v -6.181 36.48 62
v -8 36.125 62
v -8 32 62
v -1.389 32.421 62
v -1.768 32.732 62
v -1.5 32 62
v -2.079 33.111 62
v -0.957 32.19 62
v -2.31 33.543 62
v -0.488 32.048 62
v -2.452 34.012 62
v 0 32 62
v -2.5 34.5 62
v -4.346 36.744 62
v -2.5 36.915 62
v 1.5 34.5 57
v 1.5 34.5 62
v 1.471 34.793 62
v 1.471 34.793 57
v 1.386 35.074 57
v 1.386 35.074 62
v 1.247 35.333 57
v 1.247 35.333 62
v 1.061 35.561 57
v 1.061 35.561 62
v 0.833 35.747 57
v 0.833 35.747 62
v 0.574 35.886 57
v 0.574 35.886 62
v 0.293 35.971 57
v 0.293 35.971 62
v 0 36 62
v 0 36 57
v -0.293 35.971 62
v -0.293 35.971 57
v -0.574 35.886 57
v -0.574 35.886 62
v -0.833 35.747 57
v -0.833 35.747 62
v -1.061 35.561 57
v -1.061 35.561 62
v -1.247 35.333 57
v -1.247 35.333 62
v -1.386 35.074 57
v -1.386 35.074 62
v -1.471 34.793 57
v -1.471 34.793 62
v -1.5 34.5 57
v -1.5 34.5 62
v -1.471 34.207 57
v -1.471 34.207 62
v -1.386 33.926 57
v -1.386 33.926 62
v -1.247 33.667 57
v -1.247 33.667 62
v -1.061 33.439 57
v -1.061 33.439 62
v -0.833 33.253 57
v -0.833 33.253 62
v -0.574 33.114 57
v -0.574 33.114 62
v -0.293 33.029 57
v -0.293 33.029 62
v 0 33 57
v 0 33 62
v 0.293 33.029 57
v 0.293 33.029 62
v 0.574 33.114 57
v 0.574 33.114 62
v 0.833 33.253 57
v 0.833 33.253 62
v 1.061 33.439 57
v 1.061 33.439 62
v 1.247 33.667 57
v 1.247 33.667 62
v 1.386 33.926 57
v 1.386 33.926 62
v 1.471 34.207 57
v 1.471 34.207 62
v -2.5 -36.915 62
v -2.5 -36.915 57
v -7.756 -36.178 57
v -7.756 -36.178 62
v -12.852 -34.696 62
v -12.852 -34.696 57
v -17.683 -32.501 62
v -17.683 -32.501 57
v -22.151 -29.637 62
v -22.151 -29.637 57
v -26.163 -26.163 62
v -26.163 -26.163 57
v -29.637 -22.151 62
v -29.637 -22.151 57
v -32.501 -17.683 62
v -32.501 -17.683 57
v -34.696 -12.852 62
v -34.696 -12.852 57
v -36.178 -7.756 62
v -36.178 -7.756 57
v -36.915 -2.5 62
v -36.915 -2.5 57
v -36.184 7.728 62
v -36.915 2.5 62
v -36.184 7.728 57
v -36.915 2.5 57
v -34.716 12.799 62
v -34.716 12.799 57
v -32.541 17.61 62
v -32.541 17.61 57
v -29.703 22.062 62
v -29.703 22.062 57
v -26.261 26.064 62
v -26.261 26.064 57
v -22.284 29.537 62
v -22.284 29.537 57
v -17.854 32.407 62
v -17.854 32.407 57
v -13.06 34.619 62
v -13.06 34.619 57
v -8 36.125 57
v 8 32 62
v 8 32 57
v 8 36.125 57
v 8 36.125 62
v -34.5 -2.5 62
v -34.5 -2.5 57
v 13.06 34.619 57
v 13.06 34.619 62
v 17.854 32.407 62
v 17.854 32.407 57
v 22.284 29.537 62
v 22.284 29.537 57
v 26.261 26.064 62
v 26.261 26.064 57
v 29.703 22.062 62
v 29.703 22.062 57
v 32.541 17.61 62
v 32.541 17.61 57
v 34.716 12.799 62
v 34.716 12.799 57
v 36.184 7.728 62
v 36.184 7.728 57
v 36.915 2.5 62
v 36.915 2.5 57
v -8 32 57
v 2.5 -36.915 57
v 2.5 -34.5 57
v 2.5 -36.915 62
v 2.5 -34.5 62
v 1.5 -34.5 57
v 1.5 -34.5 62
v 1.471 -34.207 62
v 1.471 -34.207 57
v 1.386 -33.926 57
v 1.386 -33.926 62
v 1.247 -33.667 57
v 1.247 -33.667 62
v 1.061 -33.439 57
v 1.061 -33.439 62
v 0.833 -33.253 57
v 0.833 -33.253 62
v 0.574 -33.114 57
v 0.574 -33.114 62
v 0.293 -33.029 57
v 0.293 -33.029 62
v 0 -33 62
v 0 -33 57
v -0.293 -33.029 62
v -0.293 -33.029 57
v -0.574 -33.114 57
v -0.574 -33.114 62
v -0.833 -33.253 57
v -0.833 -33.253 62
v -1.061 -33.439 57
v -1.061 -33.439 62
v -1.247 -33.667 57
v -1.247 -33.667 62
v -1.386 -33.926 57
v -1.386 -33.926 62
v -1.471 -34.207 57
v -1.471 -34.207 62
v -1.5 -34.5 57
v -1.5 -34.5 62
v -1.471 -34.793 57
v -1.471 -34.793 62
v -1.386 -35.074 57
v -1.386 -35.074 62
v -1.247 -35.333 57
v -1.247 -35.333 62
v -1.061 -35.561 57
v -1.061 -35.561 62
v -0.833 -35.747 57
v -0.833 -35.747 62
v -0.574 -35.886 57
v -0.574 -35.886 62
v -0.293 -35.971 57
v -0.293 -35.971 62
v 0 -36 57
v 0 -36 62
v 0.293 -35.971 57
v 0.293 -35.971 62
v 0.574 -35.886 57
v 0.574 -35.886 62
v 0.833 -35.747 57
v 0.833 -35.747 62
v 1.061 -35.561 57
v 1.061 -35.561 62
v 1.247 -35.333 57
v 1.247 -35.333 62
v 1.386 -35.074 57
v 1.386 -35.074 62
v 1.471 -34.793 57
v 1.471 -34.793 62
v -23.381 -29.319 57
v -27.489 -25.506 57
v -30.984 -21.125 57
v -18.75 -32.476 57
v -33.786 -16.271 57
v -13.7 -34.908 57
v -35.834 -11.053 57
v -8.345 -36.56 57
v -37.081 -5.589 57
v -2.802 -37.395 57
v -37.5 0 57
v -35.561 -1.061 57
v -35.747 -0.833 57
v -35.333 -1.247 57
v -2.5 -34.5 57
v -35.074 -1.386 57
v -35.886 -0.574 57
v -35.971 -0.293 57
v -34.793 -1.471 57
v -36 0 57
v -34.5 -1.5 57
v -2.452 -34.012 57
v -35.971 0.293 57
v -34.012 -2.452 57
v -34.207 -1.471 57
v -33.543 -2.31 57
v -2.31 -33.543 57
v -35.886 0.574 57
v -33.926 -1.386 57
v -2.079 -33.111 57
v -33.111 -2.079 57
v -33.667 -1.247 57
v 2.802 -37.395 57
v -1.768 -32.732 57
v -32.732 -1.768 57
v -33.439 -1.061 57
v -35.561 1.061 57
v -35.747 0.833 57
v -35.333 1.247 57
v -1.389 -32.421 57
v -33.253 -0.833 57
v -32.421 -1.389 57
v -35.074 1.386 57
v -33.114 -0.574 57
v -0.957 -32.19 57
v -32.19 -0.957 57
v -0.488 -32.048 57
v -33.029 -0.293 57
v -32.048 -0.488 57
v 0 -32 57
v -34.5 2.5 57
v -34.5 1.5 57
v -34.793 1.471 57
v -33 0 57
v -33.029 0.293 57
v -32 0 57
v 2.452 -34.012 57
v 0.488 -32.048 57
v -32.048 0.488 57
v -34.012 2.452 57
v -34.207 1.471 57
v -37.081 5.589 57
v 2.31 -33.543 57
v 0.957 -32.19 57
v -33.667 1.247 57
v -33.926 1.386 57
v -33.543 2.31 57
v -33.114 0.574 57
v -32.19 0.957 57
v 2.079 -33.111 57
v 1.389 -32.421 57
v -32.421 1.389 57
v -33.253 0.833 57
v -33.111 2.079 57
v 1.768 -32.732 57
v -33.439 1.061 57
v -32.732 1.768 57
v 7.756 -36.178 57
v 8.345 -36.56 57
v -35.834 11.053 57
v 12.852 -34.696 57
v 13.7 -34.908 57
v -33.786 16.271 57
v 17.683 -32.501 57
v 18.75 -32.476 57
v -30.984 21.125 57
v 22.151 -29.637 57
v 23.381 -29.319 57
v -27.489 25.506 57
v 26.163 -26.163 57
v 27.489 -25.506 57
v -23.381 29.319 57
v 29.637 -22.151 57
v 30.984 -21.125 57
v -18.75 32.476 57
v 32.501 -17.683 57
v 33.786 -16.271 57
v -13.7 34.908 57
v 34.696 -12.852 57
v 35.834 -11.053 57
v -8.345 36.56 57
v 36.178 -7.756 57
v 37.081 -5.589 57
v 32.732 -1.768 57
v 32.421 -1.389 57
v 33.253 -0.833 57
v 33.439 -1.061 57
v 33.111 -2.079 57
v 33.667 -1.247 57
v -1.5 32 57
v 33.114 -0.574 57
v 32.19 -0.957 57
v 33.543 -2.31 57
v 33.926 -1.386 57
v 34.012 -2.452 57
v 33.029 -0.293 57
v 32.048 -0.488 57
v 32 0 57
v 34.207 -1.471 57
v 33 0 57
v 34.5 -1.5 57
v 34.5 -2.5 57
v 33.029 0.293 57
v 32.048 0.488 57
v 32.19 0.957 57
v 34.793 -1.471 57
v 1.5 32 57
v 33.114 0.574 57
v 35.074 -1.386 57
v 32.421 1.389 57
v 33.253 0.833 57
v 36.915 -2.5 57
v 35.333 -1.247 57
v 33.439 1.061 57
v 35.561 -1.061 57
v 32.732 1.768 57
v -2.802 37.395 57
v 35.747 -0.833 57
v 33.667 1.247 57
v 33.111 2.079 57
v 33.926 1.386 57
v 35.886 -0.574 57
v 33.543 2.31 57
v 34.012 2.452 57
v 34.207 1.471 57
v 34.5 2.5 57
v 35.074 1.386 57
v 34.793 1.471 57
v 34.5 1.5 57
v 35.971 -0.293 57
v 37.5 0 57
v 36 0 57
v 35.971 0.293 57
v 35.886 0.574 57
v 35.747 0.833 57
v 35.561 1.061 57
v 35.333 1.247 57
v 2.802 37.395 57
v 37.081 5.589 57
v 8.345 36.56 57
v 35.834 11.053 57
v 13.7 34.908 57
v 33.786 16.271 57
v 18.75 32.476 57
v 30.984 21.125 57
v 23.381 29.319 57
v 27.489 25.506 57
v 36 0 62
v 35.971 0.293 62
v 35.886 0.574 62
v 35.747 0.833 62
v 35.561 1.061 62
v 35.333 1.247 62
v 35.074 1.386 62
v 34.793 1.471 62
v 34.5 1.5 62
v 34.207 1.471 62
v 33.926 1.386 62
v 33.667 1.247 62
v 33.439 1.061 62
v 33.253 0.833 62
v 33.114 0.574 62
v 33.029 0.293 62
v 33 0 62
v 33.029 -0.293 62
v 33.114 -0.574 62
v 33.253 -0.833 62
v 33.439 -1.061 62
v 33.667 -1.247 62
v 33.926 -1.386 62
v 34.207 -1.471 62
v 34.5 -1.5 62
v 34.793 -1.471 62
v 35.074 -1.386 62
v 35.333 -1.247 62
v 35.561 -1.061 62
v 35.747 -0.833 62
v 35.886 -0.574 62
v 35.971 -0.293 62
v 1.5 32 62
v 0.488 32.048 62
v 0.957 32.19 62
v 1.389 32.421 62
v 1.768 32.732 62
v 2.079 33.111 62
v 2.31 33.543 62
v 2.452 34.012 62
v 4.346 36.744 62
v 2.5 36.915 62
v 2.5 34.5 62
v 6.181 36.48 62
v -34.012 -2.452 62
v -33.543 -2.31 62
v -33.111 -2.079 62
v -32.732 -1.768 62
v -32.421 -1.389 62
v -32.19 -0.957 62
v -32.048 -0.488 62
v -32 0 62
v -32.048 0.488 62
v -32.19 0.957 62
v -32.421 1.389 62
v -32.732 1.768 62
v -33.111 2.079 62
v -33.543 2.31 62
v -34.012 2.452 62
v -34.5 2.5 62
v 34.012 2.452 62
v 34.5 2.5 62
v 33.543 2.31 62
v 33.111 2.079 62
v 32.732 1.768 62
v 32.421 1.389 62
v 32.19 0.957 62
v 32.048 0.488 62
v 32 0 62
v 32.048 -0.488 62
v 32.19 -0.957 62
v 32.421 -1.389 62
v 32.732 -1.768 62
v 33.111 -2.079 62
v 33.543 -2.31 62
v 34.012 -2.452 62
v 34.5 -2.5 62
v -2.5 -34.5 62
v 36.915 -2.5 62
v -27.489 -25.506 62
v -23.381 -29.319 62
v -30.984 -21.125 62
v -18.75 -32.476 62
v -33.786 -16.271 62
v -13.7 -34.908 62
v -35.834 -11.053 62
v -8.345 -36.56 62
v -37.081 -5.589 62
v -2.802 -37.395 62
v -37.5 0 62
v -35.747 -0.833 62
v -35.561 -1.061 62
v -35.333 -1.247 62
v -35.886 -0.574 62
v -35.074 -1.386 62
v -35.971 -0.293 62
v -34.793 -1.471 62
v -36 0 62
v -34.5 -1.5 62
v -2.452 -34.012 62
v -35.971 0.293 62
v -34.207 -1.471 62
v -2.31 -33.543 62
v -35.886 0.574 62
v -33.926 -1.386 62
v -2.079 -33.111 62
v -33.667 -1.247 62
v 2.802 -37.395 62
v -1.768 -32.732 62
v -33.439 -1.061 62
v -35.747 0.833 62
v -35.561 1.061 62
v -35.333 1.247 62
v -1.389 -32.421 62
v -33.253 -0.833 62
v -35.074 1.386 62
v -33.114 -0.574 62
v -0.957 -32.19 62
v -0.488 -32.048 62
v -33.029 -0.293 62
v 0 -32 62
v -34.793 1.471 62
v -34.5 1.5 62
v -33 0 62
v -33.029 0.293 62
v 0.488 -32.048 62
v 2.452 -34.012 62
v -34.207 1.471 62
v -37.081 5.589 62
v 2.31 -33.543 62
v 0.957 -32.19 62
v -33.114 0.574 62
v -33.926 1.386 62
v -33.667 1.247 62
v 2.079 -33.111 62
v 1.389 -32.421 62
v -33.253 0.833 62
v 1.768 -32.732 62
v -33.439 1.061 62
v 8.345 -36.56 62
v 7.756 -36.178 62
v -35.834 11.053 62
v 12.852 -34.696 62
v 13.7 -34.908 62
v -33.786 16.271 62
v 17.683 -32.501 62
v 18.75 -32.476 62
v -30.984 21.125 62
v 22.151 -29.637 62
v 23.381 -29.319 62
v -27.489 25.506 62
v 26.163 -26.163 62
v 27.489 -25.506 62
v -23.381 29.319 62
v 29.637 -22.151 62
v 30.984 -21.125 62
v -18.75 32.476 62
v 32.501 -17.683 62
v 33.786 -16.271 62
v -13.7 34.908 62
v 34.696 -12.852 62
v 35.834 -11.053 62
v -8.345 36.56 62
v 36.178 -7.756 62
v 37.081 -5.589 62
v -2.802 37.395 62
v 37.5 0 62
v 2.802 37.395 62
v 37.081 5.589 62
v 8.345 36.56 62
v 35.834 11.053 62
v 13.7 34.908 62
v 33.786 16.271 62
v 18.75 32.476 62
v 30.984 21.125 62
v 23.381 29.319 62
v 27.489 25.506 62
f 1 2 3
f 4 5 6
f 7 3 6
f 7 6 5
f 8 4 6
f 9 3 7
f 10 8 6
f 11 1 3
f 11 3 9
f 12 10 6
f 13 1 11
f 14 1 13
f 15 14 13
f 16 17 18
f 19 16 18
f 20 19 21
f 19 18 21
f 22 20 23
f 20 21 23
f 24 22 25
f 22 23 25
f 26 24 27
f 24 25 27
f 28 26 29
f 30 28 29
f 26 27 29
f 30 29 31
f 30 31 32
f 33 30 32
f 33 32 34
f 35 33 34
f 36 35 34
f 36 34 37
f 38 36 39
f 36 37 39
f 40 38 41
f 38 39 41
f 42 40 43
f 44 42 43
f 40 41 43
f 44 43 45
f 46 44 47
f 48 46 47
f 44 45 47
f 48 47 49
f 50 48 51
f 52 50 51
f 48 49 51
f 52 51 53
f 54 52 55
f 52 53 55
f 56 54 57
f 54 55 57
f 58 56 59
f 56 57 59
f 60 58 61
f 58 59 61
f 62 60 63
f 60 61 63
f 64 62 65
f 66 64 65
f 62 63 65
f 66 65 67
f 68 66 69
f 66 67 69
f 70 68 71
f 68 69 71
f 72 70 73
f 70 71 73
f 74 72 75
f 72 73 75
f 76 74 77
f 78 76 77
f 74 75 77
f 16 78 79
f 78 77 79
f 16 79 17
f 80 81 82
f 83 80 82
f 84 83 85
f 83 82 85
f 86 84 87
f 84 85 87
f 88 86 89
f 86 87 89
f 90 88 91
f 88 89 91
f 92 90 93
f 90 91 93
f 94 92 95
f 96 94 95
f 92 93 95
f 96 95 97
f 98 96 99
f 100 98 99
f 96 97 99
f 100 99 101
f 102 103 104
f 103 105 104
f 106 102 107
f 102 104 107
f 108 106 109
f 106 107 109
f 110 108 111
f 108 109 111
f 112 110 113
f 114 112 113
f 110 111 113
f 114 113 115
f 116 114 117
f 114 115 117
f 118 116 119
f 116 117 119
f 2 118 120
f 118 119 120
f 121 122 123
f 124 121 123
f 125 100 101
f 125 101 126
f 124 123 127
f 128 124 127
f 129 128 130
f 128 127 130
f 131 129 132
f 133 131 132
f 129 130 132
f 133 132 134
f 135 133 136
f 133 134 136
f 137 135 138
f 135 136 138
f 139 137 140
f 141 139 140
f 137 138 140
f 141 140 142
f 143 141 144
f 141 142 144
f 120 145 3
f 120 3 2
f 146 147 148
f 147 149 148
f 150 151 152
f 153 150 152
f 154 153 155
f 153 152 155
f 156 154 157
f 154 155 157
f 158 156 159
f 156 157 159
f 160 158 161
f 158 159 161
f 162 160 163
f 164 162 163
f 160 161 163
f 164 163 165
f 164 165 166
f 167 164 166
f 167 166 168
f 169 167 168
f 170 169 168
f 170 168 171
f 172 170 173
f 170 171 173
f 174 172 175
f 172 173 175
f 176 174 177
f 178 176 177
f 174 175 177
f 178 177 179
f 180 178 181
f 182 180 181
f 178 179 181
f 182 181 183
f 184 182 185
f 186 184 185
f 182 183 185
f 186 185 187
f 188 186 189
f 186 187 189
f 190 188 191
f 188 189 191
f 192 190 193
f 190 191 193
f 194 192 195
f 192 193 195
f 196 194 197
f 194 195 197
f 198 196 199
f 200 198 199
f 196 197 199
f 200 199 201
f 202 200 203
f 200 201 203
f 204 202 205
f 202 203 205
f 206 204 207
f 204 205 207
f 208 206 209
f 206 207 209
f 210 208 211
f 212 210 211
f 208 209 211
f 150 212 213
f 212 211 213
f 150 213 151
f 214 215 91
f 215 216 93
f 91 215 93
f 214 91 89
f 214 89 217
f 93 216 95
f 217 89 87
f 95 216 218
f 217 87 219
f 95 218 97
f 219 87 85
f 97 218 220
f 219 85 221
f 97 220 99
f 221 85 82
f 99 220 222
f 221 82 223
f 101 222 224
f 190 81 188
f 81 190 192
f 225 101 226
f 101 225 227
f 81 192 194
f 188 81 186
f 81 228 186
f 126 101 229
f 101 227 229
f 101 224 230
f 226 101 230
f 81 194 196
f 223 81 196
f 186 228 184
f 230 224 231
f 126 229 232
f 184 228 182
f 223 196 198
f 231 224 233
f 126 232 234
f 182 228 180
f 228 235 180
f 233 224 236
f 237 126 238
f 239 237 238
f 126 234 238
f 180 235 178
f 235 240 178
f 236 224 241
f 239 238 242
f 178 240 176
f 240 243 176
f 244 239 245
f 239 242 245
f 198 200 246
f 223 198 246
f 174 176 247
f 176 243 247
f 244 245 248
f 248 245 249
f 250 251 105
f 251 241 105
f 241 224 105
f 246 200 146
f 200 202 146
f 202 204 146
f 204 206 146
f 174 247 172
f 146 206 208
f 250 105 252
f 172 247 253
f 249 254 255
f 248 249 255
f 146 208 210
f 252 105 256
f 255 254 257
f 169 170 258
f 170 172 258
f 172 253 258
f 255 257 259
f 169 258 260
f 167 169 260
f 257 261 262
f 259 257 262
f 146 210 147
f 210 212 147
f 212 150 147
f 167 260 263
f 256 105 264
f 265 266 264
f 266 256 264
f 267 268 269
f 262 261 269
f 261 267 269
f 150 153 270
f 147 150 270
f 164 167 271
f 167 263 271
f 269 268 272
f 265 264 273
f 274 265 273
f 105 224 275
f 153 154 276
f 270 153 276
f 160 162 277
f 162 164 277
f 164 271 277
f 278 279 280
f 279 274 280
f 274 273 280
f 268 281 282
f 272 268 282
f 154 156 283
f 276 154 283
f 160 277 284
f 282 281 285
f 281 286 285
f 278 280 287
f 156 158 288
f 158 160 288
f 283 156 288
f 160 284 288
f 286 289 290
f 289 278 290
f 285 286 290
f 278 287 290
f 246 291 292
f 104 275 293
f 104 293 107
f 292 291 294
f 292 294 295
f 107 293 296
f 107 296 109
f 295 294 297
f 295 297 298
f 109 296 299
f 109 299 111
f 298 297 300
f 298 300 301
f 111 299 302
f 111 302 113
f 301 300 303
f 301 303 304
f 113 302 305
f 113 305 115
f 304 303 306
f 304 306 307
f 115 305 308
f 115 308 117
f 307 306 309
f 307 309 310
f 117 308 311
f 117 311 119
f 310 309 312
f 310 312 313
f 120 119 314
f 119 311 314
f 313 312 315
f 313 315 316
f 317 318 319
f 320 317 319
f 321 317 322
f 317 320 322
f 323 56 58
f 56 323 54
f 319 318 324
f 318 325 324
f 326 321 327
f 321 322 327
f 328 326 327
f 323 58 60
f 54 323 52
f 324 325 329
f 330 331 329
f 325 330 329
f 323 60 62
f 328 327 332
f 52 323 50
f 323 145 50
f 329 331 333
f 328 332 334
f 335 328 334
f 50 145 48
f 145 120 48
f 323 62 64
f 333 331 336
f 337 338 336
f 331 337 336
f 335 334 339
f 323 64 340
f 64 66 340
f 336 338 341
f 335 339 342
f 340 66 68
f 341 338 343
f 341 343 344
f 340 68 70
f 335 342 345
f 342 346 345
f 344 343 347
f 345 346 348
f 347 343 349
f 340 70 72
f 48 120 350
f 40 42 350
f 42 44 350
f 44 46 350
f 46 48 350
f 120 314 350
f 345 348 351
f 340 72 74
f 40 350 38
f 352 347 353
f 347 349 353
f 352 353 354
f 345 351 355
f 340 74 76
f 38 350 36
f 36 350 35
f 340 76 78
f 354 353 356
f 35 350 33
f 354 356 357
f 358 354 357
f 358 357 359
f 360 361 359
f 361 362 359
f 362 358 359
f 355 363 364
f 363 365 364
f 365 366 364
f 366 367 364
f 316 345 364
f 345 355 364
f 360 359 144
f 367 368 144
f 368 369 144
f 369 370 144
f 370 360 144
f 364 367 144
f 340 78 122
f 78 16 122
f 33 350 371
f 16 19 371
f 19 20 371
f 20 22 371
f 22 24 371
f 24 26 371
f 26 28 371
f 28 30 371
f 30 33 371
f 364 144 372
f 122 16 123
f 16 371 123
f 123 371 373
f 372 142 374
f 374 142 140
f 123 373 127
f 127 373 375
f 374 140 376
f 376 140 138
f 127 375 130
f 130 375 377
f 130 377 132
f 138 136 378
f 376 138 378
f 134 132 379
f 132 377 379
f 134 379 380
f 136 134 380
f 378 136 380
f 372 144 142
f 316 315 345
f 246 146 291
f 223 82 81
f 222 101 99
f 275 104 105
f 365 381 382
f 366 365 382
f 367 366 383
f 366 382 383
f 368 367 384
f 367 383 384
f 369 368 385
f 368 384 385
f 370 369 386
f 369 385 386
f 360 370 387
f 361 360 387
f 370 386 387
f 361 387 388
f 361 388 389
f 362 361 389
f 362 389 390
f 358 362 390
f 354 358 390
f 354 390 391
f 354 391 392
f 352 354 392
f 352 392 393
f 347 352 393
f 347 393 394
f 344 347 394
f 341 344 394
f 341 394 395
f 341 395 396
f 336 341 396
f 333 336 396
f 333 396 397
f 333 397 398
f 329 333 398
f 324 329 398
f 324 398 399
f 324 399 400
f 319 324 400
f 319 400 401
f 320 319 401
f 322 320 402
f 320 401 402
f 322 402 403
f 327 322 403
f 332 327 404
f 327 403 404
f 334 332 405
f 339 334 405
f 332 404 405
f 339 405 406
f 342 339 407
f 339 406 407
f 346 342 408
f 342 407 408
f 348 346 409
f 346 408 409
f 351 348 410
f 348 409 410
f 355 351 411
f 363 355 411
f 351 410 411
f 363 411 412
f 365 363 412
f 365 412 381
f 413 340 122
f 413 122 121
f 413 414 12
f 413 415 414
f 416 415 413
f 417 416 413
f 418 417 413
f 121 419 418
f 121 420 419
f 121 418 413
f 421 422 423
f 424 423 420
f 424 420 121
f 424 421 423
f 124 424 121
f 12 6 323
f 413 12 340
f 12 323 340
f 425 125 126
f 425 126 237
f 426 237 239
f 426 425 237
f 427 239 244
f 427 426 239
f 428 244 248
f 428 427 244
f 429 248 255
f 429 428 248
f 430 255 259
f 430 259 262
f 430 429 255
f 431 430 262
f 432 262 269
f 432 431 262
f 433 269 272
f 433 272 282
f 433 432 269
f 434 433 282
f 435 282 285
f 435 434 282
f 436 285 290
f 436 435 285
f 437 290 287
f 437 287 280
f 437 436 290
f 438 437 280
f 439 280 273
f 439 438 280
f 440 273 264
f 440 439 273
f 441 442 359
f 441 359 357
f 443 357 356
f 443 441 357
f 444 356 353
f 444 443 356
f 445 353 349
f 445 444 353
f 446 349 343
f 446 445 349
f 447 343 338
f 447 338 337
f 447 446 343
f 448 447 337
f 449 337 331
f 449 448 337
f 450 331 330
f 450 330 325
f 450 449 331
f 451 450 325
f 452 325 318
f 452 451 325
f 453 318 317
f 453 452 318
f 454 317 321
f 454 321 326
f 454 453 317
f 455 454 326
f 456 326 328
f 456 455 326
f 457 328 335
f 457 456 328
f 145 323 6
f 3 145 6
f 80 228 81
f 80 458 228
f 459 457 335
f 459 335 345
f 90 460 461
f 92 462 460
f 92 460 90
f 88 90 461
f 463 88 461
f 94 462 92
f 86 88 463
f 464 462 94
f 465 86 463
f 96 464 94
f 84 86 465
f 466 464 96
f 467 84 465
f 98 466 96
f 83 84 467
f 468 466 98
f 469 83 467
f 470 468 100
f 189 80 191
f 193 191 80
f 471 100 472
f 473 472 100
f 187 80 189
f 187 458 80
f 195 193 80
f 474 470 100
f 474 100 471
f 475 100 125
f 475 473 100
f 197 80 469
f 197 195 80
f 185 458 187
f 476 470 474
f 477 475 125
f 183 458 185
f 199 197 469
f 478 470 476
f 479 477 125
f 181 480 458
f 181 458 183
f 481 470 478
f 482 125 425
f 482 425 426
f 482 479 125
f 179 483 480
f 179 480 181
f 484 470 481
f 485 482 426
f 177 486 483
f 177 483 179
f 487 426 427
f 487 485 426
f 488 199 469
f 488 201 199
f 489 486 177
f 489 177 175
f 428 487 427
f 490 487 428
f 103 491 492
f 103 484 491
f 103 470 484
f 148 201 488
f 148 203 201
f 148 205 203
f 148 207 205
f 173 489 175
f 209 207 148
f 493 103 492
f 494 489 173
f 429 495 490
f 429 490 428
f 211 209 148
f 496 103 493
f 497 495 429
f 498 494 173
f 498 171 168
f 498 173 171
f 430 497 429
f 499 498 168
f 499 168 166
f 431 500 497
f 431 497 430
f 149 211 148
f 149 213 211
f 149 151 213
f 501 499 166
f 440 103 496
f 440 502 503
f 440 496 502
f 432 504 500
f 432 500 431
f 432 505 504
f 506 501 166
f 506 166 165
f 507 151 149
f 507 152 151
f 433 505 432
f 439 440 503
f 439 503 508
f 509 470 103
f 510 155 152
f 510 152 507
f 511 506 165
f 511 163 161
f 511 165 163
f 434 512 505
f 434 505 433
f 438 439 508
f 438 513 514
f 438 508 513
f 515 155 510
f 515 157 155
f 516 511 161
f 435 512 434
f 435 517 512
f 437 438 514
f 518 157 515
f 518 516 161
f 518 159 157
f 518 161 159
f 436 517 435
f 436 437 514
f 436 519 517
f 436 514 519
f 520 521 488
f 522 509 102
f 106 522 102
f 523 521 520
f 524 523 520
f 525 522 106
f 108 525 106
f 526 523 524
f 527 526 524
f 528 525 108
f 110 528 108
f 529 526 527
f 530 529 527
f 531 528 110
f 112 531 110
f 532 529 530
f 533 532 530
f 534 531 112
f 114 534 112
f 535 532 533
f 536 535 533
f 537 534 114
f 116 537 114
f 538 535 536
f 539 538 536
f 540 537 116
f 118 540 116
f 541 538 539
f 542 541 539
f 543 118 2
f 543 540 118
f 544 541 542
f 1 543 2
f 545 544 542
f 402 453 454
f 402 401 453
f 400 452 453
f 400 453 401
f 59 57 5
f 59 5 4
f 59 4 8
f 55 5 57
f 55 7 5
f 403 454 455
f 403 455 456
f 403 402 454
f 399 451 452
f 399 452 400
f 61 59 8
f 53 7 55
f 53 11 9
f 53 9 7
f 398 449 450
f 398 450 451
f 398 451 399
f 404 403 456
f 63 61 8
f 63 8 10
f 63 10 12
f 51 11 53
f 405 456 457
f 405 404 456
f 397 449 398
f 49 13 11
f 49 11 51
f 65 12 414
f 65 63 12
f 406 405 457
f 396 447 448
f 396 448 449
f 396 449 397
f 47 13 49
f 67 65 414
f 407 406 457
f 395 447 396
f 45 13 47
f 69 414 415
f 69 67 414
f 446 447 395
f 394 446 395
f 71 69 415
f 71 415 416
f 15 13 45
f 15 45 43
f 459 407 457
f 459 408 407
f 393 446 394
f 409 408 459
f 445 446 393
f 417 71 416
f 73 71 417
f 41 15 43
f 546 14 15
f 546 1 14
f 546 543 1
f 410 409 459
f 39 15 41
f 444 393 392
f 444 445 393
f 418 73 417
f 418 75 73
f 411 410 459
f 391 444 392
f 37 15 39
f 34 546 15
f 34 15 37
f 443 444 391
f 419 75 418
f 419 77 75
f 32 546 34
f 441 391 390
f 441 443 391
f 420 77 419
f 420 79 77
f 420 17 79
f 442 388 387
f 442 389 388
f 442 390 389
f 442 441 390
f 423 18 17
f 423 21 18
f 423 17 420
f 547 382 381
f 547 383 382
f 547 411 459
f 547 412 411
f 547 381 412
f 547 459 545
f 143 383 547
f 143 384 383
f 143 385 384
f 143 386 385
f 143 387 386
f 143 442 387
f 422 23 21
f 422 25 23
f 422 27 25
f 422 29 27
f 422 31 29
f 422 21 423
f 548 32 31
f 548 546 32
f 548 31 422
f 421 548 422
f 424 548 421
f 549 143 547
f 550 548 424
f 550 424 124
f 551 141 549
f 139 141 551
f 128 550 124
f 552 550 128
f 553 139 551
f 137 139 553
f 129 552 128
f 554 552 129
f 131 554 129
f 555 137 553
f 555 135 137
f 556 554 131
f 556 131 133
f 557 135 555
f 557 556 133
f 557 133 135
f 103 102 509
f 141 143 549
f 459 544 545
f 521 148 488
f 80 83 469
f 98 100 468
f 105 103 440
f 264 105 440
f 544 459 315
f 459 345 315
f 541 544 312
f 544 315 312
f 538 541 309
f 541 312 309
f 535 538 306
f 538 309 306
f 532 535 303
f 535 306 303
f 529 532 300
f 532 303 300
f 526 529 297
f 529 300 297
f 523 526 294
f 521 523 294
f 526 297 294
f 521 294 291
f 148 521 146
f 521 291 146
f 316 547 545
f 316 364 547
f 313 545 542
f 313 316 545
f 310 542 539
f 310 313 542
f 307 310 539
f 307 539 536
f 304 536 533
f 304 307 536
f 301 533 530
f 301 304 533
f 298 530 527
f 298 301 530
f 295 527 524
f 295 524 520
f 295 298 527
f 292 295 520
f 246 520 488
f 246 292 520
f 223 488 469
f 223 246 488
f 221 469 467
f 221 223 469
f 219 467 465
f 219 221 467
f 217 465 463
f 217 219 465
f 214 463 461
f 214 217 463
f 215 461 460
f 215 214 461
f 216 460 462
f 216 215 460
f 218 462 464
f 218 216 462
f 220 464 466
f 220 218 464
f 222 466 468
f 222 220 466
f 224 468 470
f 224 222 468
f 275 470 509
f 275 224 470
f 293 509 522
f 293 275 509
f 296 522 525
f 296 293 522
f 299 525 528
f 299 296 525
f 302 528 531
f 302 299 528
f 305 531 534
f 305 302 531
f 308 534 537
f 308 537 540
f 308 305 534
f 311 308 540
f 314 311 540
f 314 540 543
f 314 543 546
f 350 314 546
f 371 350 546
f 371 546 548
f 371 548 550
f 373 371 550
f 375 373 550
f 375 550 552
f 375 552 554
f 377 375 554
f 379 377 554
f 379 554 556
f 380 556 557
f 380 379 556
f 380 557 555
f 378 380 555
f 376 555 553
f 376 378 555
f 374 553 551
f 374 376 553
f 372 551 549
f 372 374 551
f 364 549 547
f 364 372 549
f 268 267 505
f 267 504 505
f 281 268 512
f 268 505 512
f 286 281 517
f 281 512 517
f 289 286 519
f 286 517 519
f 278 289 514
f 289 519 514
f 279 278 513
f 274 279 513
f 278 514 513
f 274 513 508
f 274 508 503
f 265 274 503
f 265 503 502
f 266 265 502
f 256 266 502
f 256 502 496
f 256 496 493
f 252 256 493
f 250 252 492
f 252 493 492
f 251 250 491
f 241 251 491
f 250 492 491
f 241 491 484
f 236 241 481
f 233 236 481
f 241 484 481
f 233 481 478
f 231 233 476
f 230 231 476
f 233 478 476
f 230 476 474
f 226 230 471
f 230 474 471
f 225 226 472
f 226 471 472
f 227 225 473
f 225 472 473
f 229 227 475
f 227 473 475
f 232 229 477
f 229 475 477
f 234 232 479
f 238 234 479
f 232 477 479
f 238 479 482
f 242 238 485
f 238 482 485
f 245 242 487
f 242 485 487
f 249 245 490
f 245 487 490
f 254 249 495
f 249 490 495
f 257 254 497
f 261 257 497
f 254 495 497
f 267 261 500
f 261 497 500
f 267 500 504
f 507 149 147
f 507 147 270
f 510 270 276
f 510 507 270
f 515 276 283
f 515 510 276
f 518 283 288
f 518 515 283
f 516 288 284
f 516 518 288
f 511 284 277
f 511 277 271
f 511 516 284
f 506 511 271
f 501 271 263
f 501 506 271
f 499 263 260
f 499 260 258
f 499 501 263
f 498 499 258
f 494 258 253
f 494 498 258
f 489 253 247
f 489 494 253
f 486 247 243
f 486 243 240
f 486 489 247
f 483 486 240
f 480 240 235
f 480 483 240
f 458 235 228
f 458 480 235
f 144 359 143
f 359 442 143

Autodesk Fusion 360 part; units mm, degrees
sketch "Esboço2" plane through (0, 0, 0) normal (0, 0, 1) x (1, 0, 0)
  circle A0 centre (0, 0) radius 37.5
  circle A1 centre (0, 0) radius 37
  dimension "d6" = 75
  dimension "d7" = 74
extrude "Extrusão2" add sketch "Esboço2" along normal blind 190
ref_plane "Plano de trabalho9" through (0, 0, 187) normal (0, 0, 1) x (1, 0, 0)
sketch "Esboço10" plane through (0, 0, 187) normal (0, 0, 1) x (1, 0, 0)
  circle A0 centre (0, 0) radius 34.5 construction
  line L0 (0, 0) -> (-68.1762, 0) construction
  line L1 (0, 0) -> (60, 0) construction
  line L2 (0, 0) -> (0, 45) construction
  line L3 (0, 0) -> (0, -43.1659) construction
  circle A1 centre (34.5, 0) radius 1.5
  line L4 (3, -43) -> (3, -42)
  circle A2 centre (0, 34.5) radius 1.5
  circle A3 centre (-34.5, 0) radius 1.5
  circle A4 centre (0, -34.5) radius 1.5
  arc A5 (34.5, 2.5) -> (34.5, -2.5) centre (34.5, 0) ccw
  arc A6 (-2.5, 34.5) -> (2.5, 34.5) centre (0, 34.5) ccw
  arc A7 (-34.5, -2.5) -> (-34.5, 2.5) centre (-34.5, 0) ccw
  arc A8 (2.5, -34.5) -> (-2.5, -34.5) centre (0, -34.5) ccw
  circle A9 centre (0, 0) radius 37
  line L5 (-36.9154, 2.5) -> (-34.4093, 2.5)
  line L6 (-36.9154, -2.5) -> (-34.4093, -2.5)
  line L7 (34.5, 2.5) -> (36.9154, 2.5)
  line L8 (34.5, -2.5) -> (36.9154, -2.5)
  line L9 (2.5, 36.9154) -> (2.5, 34.4093)
  line L10 (-2.5, 36.9154) -> (-2.5, 34.4093)
  line L11 (-2.5, -34.4093) -> (-2.5, -36.9154)
  line L12 (2.5, -34.4093) -> (2.5, -36.9154)
  dimension "d82" = 69
  dimension "d83" = 3
  dimension "d84" = 2.5
  dimension "d85" = 2.5
  dimension "d87" = 360
  dimension "d89" = 360
  dimension "d90" = 2.5
extrude "Extrusão12" add sketch "Esboço10" against normal blind 184 contours A5 A9 L7 L8 | A6 A9 L9 L10 | A8 A9 L11 L12 | A7 A9 L5 L6
thread "Rosca3"
ref_plane "Plano de trabalho3" through (0, 0, 32) normal (0, 0, 1) x (1, 0, 0)
sketch "Esboço3" plane through (0, 0, 32) normal (0, 0, 1) x (1, 0, 0)
  line L0 (0, 0) -> (0, 37) construction
  line L1 (34.2491, 14) -> (-34.2491, 14)
  circle A0 centre (0, 0) radius 37
  line L2 (31.1288, 20) -> (-31.1288, 20)
  line L3 (32.8634, 17) -> (-32.8634, 17)
  circle A1 centre (0, 0) radius 50
  circle A2 centre (0, 0) radius 37.5
  line L4 (-8, 0) -> (8, 0)
  line L5 (8, 0) -> (8, 36.1248)
  line L6 (-8, 0) -> (-8, 36.1248)
  circle A3 centre (0, 34.5) radius 1.5
  line L7 (1.5, 32.5) -> (1.5, 0)
  arc A4 (-2.5, 34.5) -> (2.5, 34.5) centre (0, 34.5) ccw
  line L8 (-1.5, 32.5) -> (-1.5, 0)
  line L9 (27.8634, 24.3441) -> (27.8634, 11)
  line L10 (27.8634, 11) -> (35.327, 11)
  line L11 (-27.8634, 11) -> (-35.327, 11)
  line L12 (-27.8634, 24.3441) -> (-27.8634, 11)
  line L13 (-30.4631, 21) -> (30.4631, 21)
  line L14 (-34.641, 13) -> (34.641, 13)
  line L15 (0, 32) -> (8, 32)
  line L16 (0, 32) -> (-8, 32)
  dimension "d12" = 6
  dimension "d15" = 3
  dimension "d17" = 75
  dimension "d18" = 100
  dimension "d41" = 14
  dimension "d51" = 8
  dimension "d52" = 16
  dimension "d99" = 3
  dimension "d100" = 2.5
  dimension "d115" = 6.5
  dimension "d123" = 5
  dimension "d124" = 6
  dimension "d143" = 4
  dimension "d144" = 4
extrude "Extrusão21" add sketch "Esboço3" along normal blind 6 and the other way blind 6 contours L1 A0 L9 L14 | L1 A0 L3 L9 | A0 L9 L10 L14 | A0 L2 L3 L9 | A0 L2 L9 L13 | A0 L9 L13 | A0 L11 L12 L14 | L1 A0 L12 L14 | L1 A0 L3 L12 | A0 L2 L3 L12 | A0 L12 L13 | A0 L2 L12 L13
sketch "Esboço18" plane through (-27.8634, 0, 0) normal (1, 0, 0) x (0, 1, 0)
  line L0 (24.3441, 26) -> (24.3441, 38)
  line L1 (24.3441, 38) -> (11, 38)
  line L2 (11, 38) -> (11, 26)
  line L3 (11, 26) -> (24.3441, 26)
  circle A0 centre (17, 32) radius 4
  point P0 (11, 32)
  dimension "d166" = 8
  dimension "d167" = 6
  dimension "d168" = 6
ref_plane "Plano de trabalho11" through (0, 0, 0) normal (1, 0, 0) x (0, 1, 0)
extrude "Extrusão23" cut sketch "Esboço18" against normal blind 15 contours A0
extrude "Extrusão7" add sketch "Esboço3" along normal blind 30 and the other way blind 30 contours L1 L5 L7 L14 | L1 L3 L5 L7 | L4 L5 L7 L14 | L2 L3 L5 L7 | L1 L6 L8 L14 | L1 L3 L6 L8 | L2 L5 L7 L13 | L2 L3 L6 L8 | L4 L6 L8 L14 | L5 L7 L13 L15 | A0 L5 L6 L7 A4 L8 L15 L16 | L2 L6 L8 L13 | L6 L8 L13 L16 | L7 A4 L15 | A4 L8 L16
sketch "Esboço19" plane through (27.8634, 0, 0) normal (-1, 0, 0) x (0, -1, 0)
  line L0 (-11, 26) -> (-11, 38)
  line L1 (-11, 38) -> (-24.3441, 38)
  line L2 (-24.3441, 38) -> (-24.3441, 26)
  line L3 (-24.3441, 26) -> (-11, 26)
extrude "Extrusão24" cut sketch "Esboço18" along normal blind 80 contours A0
sketch "Esboço11" plane through (8, 0, 0) normal (1, 0, 0) x (0, 1, 0)
  line L0 (0, 2) -> (36.1248, 2)
  line L1 (36.1248, 2) -> (36.1248, 62)
  line L2 (36.1248, 62) -> (0, 62)
  line L3 (0, 62) -> (0, 2)
  circle A0 centre (17, 32) radius 3
  circle A1 centre (17, 32) radius 9.5
  circle A2 centre (17, 32) radius 12.5
  line L4 (36.1248, 32) -> (36.1248, -5) construction
  line L5 (0, 32) -> (36.1248, 32)
  line L6 (30.1248, 2) -> (8.3278, 22.9976)
  line L7 (30.1248, 62) -> (8.3278, 41.0024)
  line L8 (30.1248, 2) -> (31.9998, 2)
  line L9 (31.9998, 2) -> (31.9998, 32)
  line L10 (30.1248, 62) -> (31.9998, 62)
  line L11 (31.9998, 62) -> (31.9998, 32)
  circle A3 centre (17, 32) radius 4
  point P0 (14, 32)
  point P1 (20, 32)
  dimension "d106" = 6
  dimension "d107" = 19
  dimension "d109" = 25
  dimension "d110" = 6
  dimension "d147" = 1.875
extrude "Extrusão13" cut sketch "Esboço11" against normal blind 16 contours L0 L3 A2 L5 L6 | L0 A2 L5 L6 L8 L9 | L2 L3 A2 L5 L7 | A1 A2 L5 | A1 A2 L5 | L2 A2 L5 L7 L10 L11 | A1 L5 A3 | A1 L5 A3 | A0 L5 A3 | A0 L5 A3 | A0 L5 | A0 L5
ref_plane "Plano de trabalho4" through (0, 0, 150) normal (0, 0, 1) x (1, 0, 0)
sketch "Esboço4" plane through (0, 0, 150) normal (0, 0, 1) x (1, 0, 0)
  circle A0 centre (0, 0) radius 37
  circle A1 centre (0, 0) radius 50
  circle A2 centre (0, 0) radius 37.5
  line L0 (-20, -31.1288) -> (-20, 31.1288)
  line L1 (-17, -32.8634) -> (-17, 32.8634)
  line L2 (-14, -34.2491) -> (-14, 34.2491)
  line L3 (0, 8) -> (0, -8)
  line L4 (0, 8) -> (-36.1248, 8)
  line L5 (0, -8) -> (-36.1248, -8)
  line L6 (0, 0) -> (-37, 0) construction
  circle A3 centre (-34.5, 0) radius 1.5
  line L7 (0, 1.5) -> (-32.5, 1.5)
  arc A4 (-34.5, -2.5) -> (-34.5, 2.5) centre (-34.5, 0) ccw
  line L8 (0, -1.5) -> (-32.5, -1.5)
  line L9 (-24.3441, -27.8634) -> (-11, -27.8634)
  line L10 (-11, -27.8634) -> (-11, -35.327)
  line L11 (-24.3441, 27.8634) -> (-11, 27.8634)
  line L12 (-11, 27.8634) -> (-11, 35.327)
  line L13 (-13, 34.641) -> (-13, -34.641)
  line L14 (-21, 30.4631) -> (-21, -30.4631)
  line L15 (-32, 0) -> (-32, 8)
  line L16 (-32, 0) -> (-32, -8)
  dimension "d28" = 75
  dimension "d29" = 100
  dimension "d38" = 14
  dimension "d39" = 6
  dimension "d40" = 3
  dimension "d43" = 16
  dimension "d44" = 8
  dimension "d101" = 3
  dimension "d102" = 2.5
  dimension "d116" = 6.5
  dimension "d135" = 6
  dimension "d136" = 5
  dimension "d145" = 4
  dimension "d146" = 4
extrude "Extrusão25" add sketch "Esboço4" along normal blind 6 and the other way blind 6 contours A0 L11 L12 L13 | A0 L9 L10 L13 | A0 L2 L11 L13 | A0 L2 L9 L13 | A0 L1 L2 L11 | A0 L1 L2 L9 | A0 L0 L1 L11 | A0 L0 L1 L9 | A0 L0 L11 L14 | A0 L0 L9 L14 | A0 L11 L14 | A0 L9 L14
sketch "Esboço20" plane through (0, 27.8634, 0) normal (0, -1, 0) x (1, 0, 0)
  line L0 (-11, 144) -> (-11, 156)
  line L1 (-11, 156) -> (-24.3441, 156)
  line L2 (-24.3441, 156) -> (-24.3441, 144)
  line L3 (-24.3441, 144) -> (-11, 144)
  circle A0 centre (-17, 150) radius 4
  dimension "d179" = 8
  dimension "d180" = 6
  dimension "d182" = 6
extrude "Extrusão26" cut sketch "Esboço20" against normal blind 15 contours A0
sketch "Esboço21" plane through (0, -27.8634, 0) normal (0, 1, 0) x (-1, 0, 0)
  line L0 (24.3441, 144) -> (24.3441, 156)
  line L1 (24.3441, 156) -> (11, 156)
  line L2 (11, 156) -> (11, 144)
  line L3 (11, 144) -> (24.3441, 144)
  circle A0 centre (17, 150) radius 4
  dimension "d185" = 8
  dimension "d186" = 6
  dimension "d187" = 6
extrude "Extrusão27" cut sketch "Esboço21" against normal blind 15 contours A0
extrude "Extrusão6" add sketch "Esboço4" along normal blind 30 and the other way blind 30 contours L2 L4 L7 L13 | L3 L4 L7 L13 | L3 L5 L8 L13 | L2 L5 L8 L13 | L1 L2 L4 L7 | L1 L2 L5 L8 | L0 L1 L4 L7 | L0 L1 L5 L8 | L0 L4 L7 L14 | L0 L5 L8 L14 | A0 L4 L5 L7 A4 L8 L15 L16 | L4 L7 L14 L15 | L5 L8 L14 L16 | L7 A4 L15 | A4 L8 L16
sketch "Esboço13" plane through (0, -8, 0) normal (0, -1, 0) x (1, 0, 0)
  line L0 (0, 120) -> (0, 180)
  line L1 (0, 180) -> (-36.1248, 180)
  line L2 (-36.1248, 180) -> (-36.1248, 120)
  line L3 (-36.1248, 120) -> (0, 120)
  circle A0 centre (-17, 150) radius 3
  circle A1 centre (-17, 150) radius 9.5
  circle A2 centre (-17, 150) radius 12.5
  line L4 (-36.1248, 150) -> (-36.1248, 198.4836) construction
  line L5 (-30.1248, 180) -> (-6.6704, 157.4058)
  line L6 (0, 150) -> (-36.1248, 150)
  line L7 (-30.1248, 120) -> (-6.6704, 142.5942)
  line L8 (-30.1248, 180) -> (-31.9998, 180)
  line L9 (-31.9998, 180) -> (-31.9998, 150)
  line L10 (-30.1248, 120) -> (-31.9998, 120)
  line L11 (-31.9998, 120) -> (-31.9998, 150)
  point P0 (-14, 150)
  point P1 (-20, 150)
  dimension "d117" = 6
  dimension "d118" = 19
  dimension "d119" = 25
  dimension "d120" = 6
  dimension "d148" = 1.875
extrude "Extrusão14" cut sketch "Esboço13" against normal blind 16 contours L0 L3 A2 L6 L7 | L0 L1 A2 L5 L6 | L3 A2 L6 L7 L10 L11 | A1 A2 L6 | A1 A2 L6 | L1 A2 L5 L6 L8 L9 | A0 A1 L6 | A0 A1 L6 | A0 L6 | A0 L6
ref_plane "Plano de trabalho5" through (0, 0, 0) normal (1, 0, 0) x (0, 1, 0)
ref_plane "Plano de trabalho6" through (0, 0, 0) normal (0, 1, 0) x (0, 0, 1)
ref_plane "Plano de trabalho7" through (0, 0, 134.3) normal (0, 0, 1) x (1, 0, 0)
sketch "Esboço8" plane through (0, 0, 134.3) normal (0, 0, 1) x (1, 0, 0)
  line L0 (46.3444, 0) -> (0, 0) construction
  line L1 (8, 36.1248) -> (8, -36.1248)
  line L2 (-8, -36.1248) -> (-8, 36.1248)
  circle A0 centre (0, 0) radius 37
  line L3 (0, 0) -> (0, 37) construction
  circle A1 centre (0, 34.5) radius 1.5
  circle A2 centre (0, -34.5) radius 1.5
  dimension "d72" = 8
  dimension "d73" = 8
  dimension "d95" = 2.5
  dimension "d96" = 3
extrude "Extrusão10" add sketch "Esboço8" along normal blind 2 contours L1 L2 A0
ref_plane "Plano de trabalho8" through (0, 0, 45.7) normal (0, 0, 1) x (1, 0, 0)
sketch "Esboço9" plane through (0, 0, 45.7) normal (0, 0, 1) x (1, 0, 0)
  line L0 (0, 0) -> (-37, 0) construction
  line L1 (-36.1248, 8) -> (36.1248, 8)
  line L2 (-36.1248, -8) -> (36.1248, -8)
  circle A0 centre (0, 0) radius 37
  circle A1 centre (-34.5, 0) radius 1.5
  line L3 (0, 0) -> (0, 43.2459) construction
  circle A2 centre (34.5, 0) radius 1.5
  dimension "d77" = 8
  dimension "d78" = 8
  dimension "d97" = 3
  dimension "d98" = 2.5
extrude "Extrusão11" add sketch "Esboço9" along normal blind 2 contours L1 L2 A0
ref_plane "Plano de trabalho10" through (8, 18.0624, 32) normal (1, 0, 0) x (0, 1, 0)
sketch "Esboço16" plane through (-31.9998, 0, 0) normal (1, 0, 0) x (0, 1, 0)
  line L0 (1.5, 180) -> (1.5, 120)
  line L1 (1.5, 120) -> (8, 120)
  line L2 (8, 120) -> (8, 180)
  line L3 (8, 180) -> (1.5, 180)
  line L4 (4.75, 180) -> (4.75, 120) construction
  circle A0 centre (4.75, 170) radius 1.5
  circle A1 centre (4.75, 130) radius 1.5
  line L5 (8, 150) -> (-12.335, 150) construction
  line L6 (0, 2.5) -> (0, 20)
  circle A2 centre (-4.75, 170) radius 1.5
  circle A3 centre (-4.75, 130) radius 1.5
  dimension "d149" = 3
  dimension "d150" = 3
  dimension "d151" = 40
  dimension "d152" = 20
extrude "Extrusão19" cut sketch "Esboço16" against normal blind 10 contours A0 | A1 | A2 | A3
sketch "Esboço17" plane through (0, 31.9998, 0) normal (0, -1, 0) x (1, 0, 0)
  line L0 (1.5, 62) -> (1.5, 2)
  line L1 (1.5, 2) -> (8, 2)
  line L2 (8, 2) -> (8, 62)
  line L3 (8, 62) -> (1.5, 62)
  line L4 (4.75, 2) -> (4.75, 62) construction
  line L5 (8, 32) -> (-12, 32) construction
  circle A0 centre (4.75, 52) radius 1.5
  circle A1 centre (4.75, 12) radius 1.5
  line L6 (0, 1.75) -> (0, 22.5)
  circle A2 centre (-4.75, 12) radius 1.5
  circle A3 centre (-4.75, 52) radius 1.5
  dimension "d155" = 3
  dimension "d156" = 3
  dimension "d157" = 40
  dimension "d158" = 20
extrude "Extrusão20" cut sketch "Esboço17" against normal blind 10 contours A0 | A1 | A2 | A3
thread "Rosca4"
thread "Rosca5"
sketch "Esboço22" plane through (0, 0, 136.3) normal (0, 0, 1) x (-1, 0, 0)
  line L0 (2.5, 36.9154) -> (2.5, 34.5)
  arc A0 (-2.5, 34.5) -> (2.5, 34.5) centre (0, 34.5) ccw
  line L1 (-2.5, 34.5) -> (-2.5, 36.9154)
  arc A1 (-2.5, 36.9154) -> (-8, 36.1248) centre (0, 0) ccw
  line L2 (-8, 36.1248) -> (-8, -36.1248)
  arc A2 (-8, -36.1248) -> (-2.5, -36.9154) centre (0, 0) ccw
  line L3 (-2.5, -36.9154) -> (-2.5, -34.5)
  arc A3 (2.5, -34.5) -> (-2.5, -34.5) centre (0, -34.5) ccw
  line L4 (2.5, -34.5) -> (2.5, -36.9154)
  arc A4 (2.5, -36.9154) -> (8, -36.1248) centre (0, 0) ccw
  line L5 (8, -36.1248) -> (8, 36.1248)
  arc A5 (8, 36.1248) -> (2.5, 36.9154) centre (0, 0) ccw
  line L6 (0, 0) -> (-21, 0) construction
  line L7 (0, 0) -> (0, -19.3) construction
  line L8 (2, -15.8) -> (-2, -15.8)
  arc A6 (-2, -15.8) -> (-2, -22.8) centre (-2, -19.3) ccw
  line L9 (-2, -22.8) -> (2, -22.8)
  arc A7 (2, -22.8) -> (2, -15.8) centre (2, -19.3) ccw
  line L10 (2, -19.3) -> (-2, -19.3) construction
  arc A8 (-2, 22.8) -> (-2, 15.8) centre (-2, 19.3) ccw
  line L11 (2, 15.8) -> (-2, 15.8)
  arc A9 (2, 15.8) -> (2, 22.8) centre (2, 19.3) ccw
  line L12 (-2, 22.8) -> (2, 22.8)
  circle A10 centre (0, 10.8) radius 1.5 construction
  line L13 (2, 19.3) -> (-2, 19.3) construction
  line L14 (2, 12.3) -> (-2, 12.3)
  arc A11 (-2, 12.3) -> (-2, 9.3) centre (-2, 10.8) ccw
  line L15 (-2, 9.3) -> (2, 9.3)
  arc A12 (2, 9.3) -> (2, 12.3) centre (2, 10.8) ccw
  line L16 (2, 10.8) -> (-2, 10.8) construction
  line L17 (2, 26.3) -> (-2, 26.3)
  arc A13 (2, 26.3) -> (2, 29.3) centre (2, 27.8) ccw
  line L18 (-2, 29.3) -> (2, 29.3)
  arc A14 (-2, 29.3) -> (-2, 26.3) centre (-2, 27.8) ccw
  arc A15 (2, -29.3) -> (2, -26.3) centre (2, -27.8) ccw
  line L19 (2, -26.3) -> (-2, -26.3)
  arc A16 (-2, -26.3) -> (-2, -29.3) centre (-2, -27.8) ccw
  line L20 (-2, -29.3) -> (2, -29.3)
  arc A17 (2, -12.3) -> (2, -9.3) centre (2, -10.8) ccw
  line L21 (-2, -9.3) -> (2, -9.3)
  arc A18 (-2, -9.3) -> (-2, -12.3) centre (-2, -10.8) ccw
  line L22 (2, -12.3) -> (-2, -12.3)
  point P0 (0, -19.3)
  point P1 (0, 10.8)
  dimension "d191" = 19.3
  dimension "d195" = 2
  dimension "d196" = 3.5
  dimension "d204" = 3
  dimension "d205" = 8.5
  dimension "d230" = 1.5
  dimension "d231" = 4
extrude "Extrusão28" cut sketch "Esboço22" against normal blind 5 contours L8 A6 L9 A7 | A8 L11 A9 L12 | L14 A11 L15 A12 | L17 A13 L18 A14 | A15 L19 A16 L20 | A17 L21 A18 L22
sketch "Esboço23" plane through (0, 0, 45.7) normal (0, 0, -1) x (1, 0, 0)
  line L0 (36.9154, -2.5) -> (34.5, -2.5)
  arc A0 (34.5, 2.5) -> (34.5, -2.5) centre (34.5, 0) ccw
  line L1 (34.5, 2.5) -> (36.9154, 2.5)
  arc A1 (36.9154, 2.5) -> (36.1248, 8) centre (0, 0) ccw
  line L2 (36.1248, 8) -> (-36.1248, 8)
  arc A2 (-36.1248, 8) -> (-36.9154, 2.5) centre (0, 0) ccw
  line L3 (-36.9154, 2.5) -> (-34.5, 2.5)
  arc A3 (-34.5, -2.5) -> (-34.5, 2.5) centre (-34.5, 0) ccw
  line L4 (-34.5, -2.5) -> (-36.9154, -2.5)
  arc A4 (-36.9154, -2.5) -> (-36.1248, -8) centre (0, 0) ccw
  line L5 (-36.1248, -8) -> (36.1248, -8)
  arc A5 (36.1248, -8) -> (36.9154, -2.5) centre (0, 0) ccw
  line L6 (0, 0) -> (0, -19) construction
  line L7 (0, 0) -> (19.3, 0)
  line L8 (15.8, 2.5) -> (15.8, -2.5)
  arc A6 (15.8, -2.5) -> (22.8, -2.5) centre (19.3, -2.5) ccw
  line L9 (22.8, -2.5) -> (22.8, 2.5)
  arc A7 (22.8, 2.5) -> (15.8, 2.5) centre (19.3, 2.5) ccw
  line L10 (19.3, 2.5) -> (19.3, -2.5) construction
  line L11 (-15.8, 2.5) -> (-15.8, -2.5)
  arc A8 (-15.8, 2.5) -> (-22.8, 2.5) centre (-19.3, 2.5) ccw
  line L12 (-22.8, -2.5) -> (-22.8, 2.5)
  arc A9 (-22.8, -2.5) -> (-15.8, -2.5) centre (-19.3, -2.5) ccw
  circle A10 centre (10.8, 0) radius 1.5 construction
  circle A11 centre (27.8, 0) radius 1.5 construction
  line L13 (9.3, 2.5) -> (9.3, -2.5)
  arc A12 (9.3, -2.5) -> (12.3, -2.5) centre (10.8, -2.5) ccw
  line L14 (12.3, -2.5) -> (12.3, 2.5)
  arc A13 (12.3, 2.5) -> (9.3, 2.5) centre (10.8, 2.5) ccw
  line L15 (10.8, 2.5) -> (10.8, -2.5) construction
  line L16 (26.3, -2.5) -> (26.3, 2.5)
  arc A14 (26.3, -2.5) -> (29.3, -2.5) centre (27.8, -2.5) ccw
  line L17 (29.3, 2.5) -> (29.3, -2.5)
  arc A15 (29.3, 2.5) -> (26.3, 2.5) centre (27.8, 2.5) ccw
  line L18 (-12.3, -2.5) -> (-12.3, 2.5)
  arc A16 (-12.3, -2.5) -> (-9.3, -2.5) centre (-10.8, -2.5) ccw
  line L19 (-9.3, 2.5) -> (-9.3, -2.5)
  arc A17 (-9.3, 2.5) -> (-12.3, 2.5) centre (-10.8, 2.5) ccw
  line L20 (-26.3, -2.5) -> (-26.3, 2.5)
  arc A18 (-29.3, -2.5) -> (-26.3, -2.5) centre (-27.8, -2.5) ccw
  line L21 (-29.3, 2.5) -> (-29.3, -2.5)
  arc A19 (-26.3, 2.5) -> (-29.3, 2.5) centre (-27.8, 2.5) ccw
  point P0 (19.3, 0)
  point P1 (10.8, 0)
  dimension "d199" = 3.5
  dimension "d200" = 5
  dimension "d201" = 19.3
  dimension "d206" = 3
  dimension "d207" = 8.5
  dimension "d228" = 2.5
  dimension "d229" = 1.5
extrude "Extrusão29" cut sketch "Esboço23" against normal blind 10 contours L7 L13 L14 A13 | L8 A6 L9 A7 | L7 L13 A12 L14 | L11 A8 L12 A9 | L16 A14 L17 A15 | L20 A18 L21 A19
ref_plane "Plano de trabalho12" through (0, 0, 106.3) normal (0, 0, 1) x (1, 0, 0)
sketch "Esboço24" plane through (0, 0, 106.3) normal (0, 0, 1) x (1, 0, 0)
  line L0 (0, 0) -> (28.1868, 0) construction
  line L1 (16, 0) -> (16, 33.3617)
  circle A0 centre (0, 0) radius 37
  line L2 (16, 0) -> (16, -33.3617)
  line L3 (0, 0) -> (0, 19.3) construction
  line L4 (-16, 0) -> (-16, 33.3617)
  line L5 (-16, 0) -> (-16, -33.3617)
  line L6 (-2, 6.8) -> (2, 6.8)
  arc A1 (2, 6.8) -> (2, 31.8) centre (2, 19.3) ccw
  line L7 (2, 31.8) -> (-2, 31.8)
  arc A2 (-2, 31.8) -> (-2, 6.8) centre (-2, 19.3) ccw
  line L8 (-2, 19.3) -> (2, 19.3) construction
  arc A3 (2, -31.8) -> (2, -6.8) centre (2, -19.3) ccw
  arc A4 (-2, -6.8) -> (-2, -31.8) centre (-2, -19.3) ccw
  line L9 (-2, -6.8) -> (2, -6.8)
  line L10 (2, -31.8) -> (-2, -31.8)
  circle A5 centre (0, 34.5) radius 1.5
  circle A6 centre (0, -34.5) radius 1.5
  point P0 (0, 19.3)
  dimension "d209" = 16
  dimension "d210" = 12.5
  dimension "d211" = 4
  dimension "d212" = 19.3
  dimension "d215" = 3
  dimension "d216" = 34.5
ref_plane "Plano de trabalho13" through (0, 0, 55.7) normal (0, 0, -1) x (-1, 0, 0)
ref_plane "Plano de trabalho14" through (0, 0, 60) normal (0, 0, 1) x (1, 0, 0)
sketch "Esboço25" plane through (0, 0, 55.7) normal (0, 0, -1) x (1, 0, 0)
  line L0 (-33.3617, 16) -> (33.3617, 16)
  circle A0 centre (0, 0) radius 37
  line L1 (0, 0) -> (-19.3, 0) construction
  line L2 (-33.3617, -16) -> (33.3617, -16)
  line L3 (-6.8, -2) -> (-6.8, 2)
  arc A1 (-6.8, 2) -> (-31.8, 2) centre (-19.3, 2) ccw
  line L4 (-31.8, 2) -> (-31.8, -2)
  arc A2 (-31.8, -2) -> (-6.8, -2) centre (-19.3, -2) ccw
  line L5 (-19.3, -2) -> (-19.3, 2) construction
  circle A3 centre (-34.5, 0) radius 1.5
  line L6 (0, 0) -> (0, -12) construction
  arc A4 (31.8, 2) -> (6.8, 2) centre (19.3, 2) ccw
  line L7 (6.8, -2) -> (6.8, 2)
  arc A5 (6.8, -2) -> (31.8, -2) centre (19.3, -2) ccw
  circle A6 centre (34.5, 0) radius 1.5
  line L8 (31.8, 2) -> (31.8, -2)
  point P0 (-19.3, 0)
  dimension "d219" = 16
  dimension "d220" = 12.5
  dimension "d221" = 4
  dimension "d222" = 19.3
  dimension "d224" = 34.5
  dimension "d225" = 3
ref_plane "Plano de trabalho15" through (0, 0, 57) normal (0, 0, 1) x (1, 0, 0)
ref_plane "Plano de trabalho16" through (0, 0, 62) normal (0, 0, 1) x (1, 0, 0)
sketch "Esboço26" plane through (0, 0, 57) normal (0, 0, 1) x (1, 0, 0)
  circle A0 centre (0, 0) radius 46.0977
extrude "Extrusão32" cut sketch "Esboço26" against normal blind 100
sketch "Esboço28" plane through (0, 0, 62) normal (0, 0, 1) x (1, 0, 0)
  circle A0 centre (0, 0) radius 43.0116
extrude "Extrusão33" cut sketch "Esboço28" along normal blind 200
